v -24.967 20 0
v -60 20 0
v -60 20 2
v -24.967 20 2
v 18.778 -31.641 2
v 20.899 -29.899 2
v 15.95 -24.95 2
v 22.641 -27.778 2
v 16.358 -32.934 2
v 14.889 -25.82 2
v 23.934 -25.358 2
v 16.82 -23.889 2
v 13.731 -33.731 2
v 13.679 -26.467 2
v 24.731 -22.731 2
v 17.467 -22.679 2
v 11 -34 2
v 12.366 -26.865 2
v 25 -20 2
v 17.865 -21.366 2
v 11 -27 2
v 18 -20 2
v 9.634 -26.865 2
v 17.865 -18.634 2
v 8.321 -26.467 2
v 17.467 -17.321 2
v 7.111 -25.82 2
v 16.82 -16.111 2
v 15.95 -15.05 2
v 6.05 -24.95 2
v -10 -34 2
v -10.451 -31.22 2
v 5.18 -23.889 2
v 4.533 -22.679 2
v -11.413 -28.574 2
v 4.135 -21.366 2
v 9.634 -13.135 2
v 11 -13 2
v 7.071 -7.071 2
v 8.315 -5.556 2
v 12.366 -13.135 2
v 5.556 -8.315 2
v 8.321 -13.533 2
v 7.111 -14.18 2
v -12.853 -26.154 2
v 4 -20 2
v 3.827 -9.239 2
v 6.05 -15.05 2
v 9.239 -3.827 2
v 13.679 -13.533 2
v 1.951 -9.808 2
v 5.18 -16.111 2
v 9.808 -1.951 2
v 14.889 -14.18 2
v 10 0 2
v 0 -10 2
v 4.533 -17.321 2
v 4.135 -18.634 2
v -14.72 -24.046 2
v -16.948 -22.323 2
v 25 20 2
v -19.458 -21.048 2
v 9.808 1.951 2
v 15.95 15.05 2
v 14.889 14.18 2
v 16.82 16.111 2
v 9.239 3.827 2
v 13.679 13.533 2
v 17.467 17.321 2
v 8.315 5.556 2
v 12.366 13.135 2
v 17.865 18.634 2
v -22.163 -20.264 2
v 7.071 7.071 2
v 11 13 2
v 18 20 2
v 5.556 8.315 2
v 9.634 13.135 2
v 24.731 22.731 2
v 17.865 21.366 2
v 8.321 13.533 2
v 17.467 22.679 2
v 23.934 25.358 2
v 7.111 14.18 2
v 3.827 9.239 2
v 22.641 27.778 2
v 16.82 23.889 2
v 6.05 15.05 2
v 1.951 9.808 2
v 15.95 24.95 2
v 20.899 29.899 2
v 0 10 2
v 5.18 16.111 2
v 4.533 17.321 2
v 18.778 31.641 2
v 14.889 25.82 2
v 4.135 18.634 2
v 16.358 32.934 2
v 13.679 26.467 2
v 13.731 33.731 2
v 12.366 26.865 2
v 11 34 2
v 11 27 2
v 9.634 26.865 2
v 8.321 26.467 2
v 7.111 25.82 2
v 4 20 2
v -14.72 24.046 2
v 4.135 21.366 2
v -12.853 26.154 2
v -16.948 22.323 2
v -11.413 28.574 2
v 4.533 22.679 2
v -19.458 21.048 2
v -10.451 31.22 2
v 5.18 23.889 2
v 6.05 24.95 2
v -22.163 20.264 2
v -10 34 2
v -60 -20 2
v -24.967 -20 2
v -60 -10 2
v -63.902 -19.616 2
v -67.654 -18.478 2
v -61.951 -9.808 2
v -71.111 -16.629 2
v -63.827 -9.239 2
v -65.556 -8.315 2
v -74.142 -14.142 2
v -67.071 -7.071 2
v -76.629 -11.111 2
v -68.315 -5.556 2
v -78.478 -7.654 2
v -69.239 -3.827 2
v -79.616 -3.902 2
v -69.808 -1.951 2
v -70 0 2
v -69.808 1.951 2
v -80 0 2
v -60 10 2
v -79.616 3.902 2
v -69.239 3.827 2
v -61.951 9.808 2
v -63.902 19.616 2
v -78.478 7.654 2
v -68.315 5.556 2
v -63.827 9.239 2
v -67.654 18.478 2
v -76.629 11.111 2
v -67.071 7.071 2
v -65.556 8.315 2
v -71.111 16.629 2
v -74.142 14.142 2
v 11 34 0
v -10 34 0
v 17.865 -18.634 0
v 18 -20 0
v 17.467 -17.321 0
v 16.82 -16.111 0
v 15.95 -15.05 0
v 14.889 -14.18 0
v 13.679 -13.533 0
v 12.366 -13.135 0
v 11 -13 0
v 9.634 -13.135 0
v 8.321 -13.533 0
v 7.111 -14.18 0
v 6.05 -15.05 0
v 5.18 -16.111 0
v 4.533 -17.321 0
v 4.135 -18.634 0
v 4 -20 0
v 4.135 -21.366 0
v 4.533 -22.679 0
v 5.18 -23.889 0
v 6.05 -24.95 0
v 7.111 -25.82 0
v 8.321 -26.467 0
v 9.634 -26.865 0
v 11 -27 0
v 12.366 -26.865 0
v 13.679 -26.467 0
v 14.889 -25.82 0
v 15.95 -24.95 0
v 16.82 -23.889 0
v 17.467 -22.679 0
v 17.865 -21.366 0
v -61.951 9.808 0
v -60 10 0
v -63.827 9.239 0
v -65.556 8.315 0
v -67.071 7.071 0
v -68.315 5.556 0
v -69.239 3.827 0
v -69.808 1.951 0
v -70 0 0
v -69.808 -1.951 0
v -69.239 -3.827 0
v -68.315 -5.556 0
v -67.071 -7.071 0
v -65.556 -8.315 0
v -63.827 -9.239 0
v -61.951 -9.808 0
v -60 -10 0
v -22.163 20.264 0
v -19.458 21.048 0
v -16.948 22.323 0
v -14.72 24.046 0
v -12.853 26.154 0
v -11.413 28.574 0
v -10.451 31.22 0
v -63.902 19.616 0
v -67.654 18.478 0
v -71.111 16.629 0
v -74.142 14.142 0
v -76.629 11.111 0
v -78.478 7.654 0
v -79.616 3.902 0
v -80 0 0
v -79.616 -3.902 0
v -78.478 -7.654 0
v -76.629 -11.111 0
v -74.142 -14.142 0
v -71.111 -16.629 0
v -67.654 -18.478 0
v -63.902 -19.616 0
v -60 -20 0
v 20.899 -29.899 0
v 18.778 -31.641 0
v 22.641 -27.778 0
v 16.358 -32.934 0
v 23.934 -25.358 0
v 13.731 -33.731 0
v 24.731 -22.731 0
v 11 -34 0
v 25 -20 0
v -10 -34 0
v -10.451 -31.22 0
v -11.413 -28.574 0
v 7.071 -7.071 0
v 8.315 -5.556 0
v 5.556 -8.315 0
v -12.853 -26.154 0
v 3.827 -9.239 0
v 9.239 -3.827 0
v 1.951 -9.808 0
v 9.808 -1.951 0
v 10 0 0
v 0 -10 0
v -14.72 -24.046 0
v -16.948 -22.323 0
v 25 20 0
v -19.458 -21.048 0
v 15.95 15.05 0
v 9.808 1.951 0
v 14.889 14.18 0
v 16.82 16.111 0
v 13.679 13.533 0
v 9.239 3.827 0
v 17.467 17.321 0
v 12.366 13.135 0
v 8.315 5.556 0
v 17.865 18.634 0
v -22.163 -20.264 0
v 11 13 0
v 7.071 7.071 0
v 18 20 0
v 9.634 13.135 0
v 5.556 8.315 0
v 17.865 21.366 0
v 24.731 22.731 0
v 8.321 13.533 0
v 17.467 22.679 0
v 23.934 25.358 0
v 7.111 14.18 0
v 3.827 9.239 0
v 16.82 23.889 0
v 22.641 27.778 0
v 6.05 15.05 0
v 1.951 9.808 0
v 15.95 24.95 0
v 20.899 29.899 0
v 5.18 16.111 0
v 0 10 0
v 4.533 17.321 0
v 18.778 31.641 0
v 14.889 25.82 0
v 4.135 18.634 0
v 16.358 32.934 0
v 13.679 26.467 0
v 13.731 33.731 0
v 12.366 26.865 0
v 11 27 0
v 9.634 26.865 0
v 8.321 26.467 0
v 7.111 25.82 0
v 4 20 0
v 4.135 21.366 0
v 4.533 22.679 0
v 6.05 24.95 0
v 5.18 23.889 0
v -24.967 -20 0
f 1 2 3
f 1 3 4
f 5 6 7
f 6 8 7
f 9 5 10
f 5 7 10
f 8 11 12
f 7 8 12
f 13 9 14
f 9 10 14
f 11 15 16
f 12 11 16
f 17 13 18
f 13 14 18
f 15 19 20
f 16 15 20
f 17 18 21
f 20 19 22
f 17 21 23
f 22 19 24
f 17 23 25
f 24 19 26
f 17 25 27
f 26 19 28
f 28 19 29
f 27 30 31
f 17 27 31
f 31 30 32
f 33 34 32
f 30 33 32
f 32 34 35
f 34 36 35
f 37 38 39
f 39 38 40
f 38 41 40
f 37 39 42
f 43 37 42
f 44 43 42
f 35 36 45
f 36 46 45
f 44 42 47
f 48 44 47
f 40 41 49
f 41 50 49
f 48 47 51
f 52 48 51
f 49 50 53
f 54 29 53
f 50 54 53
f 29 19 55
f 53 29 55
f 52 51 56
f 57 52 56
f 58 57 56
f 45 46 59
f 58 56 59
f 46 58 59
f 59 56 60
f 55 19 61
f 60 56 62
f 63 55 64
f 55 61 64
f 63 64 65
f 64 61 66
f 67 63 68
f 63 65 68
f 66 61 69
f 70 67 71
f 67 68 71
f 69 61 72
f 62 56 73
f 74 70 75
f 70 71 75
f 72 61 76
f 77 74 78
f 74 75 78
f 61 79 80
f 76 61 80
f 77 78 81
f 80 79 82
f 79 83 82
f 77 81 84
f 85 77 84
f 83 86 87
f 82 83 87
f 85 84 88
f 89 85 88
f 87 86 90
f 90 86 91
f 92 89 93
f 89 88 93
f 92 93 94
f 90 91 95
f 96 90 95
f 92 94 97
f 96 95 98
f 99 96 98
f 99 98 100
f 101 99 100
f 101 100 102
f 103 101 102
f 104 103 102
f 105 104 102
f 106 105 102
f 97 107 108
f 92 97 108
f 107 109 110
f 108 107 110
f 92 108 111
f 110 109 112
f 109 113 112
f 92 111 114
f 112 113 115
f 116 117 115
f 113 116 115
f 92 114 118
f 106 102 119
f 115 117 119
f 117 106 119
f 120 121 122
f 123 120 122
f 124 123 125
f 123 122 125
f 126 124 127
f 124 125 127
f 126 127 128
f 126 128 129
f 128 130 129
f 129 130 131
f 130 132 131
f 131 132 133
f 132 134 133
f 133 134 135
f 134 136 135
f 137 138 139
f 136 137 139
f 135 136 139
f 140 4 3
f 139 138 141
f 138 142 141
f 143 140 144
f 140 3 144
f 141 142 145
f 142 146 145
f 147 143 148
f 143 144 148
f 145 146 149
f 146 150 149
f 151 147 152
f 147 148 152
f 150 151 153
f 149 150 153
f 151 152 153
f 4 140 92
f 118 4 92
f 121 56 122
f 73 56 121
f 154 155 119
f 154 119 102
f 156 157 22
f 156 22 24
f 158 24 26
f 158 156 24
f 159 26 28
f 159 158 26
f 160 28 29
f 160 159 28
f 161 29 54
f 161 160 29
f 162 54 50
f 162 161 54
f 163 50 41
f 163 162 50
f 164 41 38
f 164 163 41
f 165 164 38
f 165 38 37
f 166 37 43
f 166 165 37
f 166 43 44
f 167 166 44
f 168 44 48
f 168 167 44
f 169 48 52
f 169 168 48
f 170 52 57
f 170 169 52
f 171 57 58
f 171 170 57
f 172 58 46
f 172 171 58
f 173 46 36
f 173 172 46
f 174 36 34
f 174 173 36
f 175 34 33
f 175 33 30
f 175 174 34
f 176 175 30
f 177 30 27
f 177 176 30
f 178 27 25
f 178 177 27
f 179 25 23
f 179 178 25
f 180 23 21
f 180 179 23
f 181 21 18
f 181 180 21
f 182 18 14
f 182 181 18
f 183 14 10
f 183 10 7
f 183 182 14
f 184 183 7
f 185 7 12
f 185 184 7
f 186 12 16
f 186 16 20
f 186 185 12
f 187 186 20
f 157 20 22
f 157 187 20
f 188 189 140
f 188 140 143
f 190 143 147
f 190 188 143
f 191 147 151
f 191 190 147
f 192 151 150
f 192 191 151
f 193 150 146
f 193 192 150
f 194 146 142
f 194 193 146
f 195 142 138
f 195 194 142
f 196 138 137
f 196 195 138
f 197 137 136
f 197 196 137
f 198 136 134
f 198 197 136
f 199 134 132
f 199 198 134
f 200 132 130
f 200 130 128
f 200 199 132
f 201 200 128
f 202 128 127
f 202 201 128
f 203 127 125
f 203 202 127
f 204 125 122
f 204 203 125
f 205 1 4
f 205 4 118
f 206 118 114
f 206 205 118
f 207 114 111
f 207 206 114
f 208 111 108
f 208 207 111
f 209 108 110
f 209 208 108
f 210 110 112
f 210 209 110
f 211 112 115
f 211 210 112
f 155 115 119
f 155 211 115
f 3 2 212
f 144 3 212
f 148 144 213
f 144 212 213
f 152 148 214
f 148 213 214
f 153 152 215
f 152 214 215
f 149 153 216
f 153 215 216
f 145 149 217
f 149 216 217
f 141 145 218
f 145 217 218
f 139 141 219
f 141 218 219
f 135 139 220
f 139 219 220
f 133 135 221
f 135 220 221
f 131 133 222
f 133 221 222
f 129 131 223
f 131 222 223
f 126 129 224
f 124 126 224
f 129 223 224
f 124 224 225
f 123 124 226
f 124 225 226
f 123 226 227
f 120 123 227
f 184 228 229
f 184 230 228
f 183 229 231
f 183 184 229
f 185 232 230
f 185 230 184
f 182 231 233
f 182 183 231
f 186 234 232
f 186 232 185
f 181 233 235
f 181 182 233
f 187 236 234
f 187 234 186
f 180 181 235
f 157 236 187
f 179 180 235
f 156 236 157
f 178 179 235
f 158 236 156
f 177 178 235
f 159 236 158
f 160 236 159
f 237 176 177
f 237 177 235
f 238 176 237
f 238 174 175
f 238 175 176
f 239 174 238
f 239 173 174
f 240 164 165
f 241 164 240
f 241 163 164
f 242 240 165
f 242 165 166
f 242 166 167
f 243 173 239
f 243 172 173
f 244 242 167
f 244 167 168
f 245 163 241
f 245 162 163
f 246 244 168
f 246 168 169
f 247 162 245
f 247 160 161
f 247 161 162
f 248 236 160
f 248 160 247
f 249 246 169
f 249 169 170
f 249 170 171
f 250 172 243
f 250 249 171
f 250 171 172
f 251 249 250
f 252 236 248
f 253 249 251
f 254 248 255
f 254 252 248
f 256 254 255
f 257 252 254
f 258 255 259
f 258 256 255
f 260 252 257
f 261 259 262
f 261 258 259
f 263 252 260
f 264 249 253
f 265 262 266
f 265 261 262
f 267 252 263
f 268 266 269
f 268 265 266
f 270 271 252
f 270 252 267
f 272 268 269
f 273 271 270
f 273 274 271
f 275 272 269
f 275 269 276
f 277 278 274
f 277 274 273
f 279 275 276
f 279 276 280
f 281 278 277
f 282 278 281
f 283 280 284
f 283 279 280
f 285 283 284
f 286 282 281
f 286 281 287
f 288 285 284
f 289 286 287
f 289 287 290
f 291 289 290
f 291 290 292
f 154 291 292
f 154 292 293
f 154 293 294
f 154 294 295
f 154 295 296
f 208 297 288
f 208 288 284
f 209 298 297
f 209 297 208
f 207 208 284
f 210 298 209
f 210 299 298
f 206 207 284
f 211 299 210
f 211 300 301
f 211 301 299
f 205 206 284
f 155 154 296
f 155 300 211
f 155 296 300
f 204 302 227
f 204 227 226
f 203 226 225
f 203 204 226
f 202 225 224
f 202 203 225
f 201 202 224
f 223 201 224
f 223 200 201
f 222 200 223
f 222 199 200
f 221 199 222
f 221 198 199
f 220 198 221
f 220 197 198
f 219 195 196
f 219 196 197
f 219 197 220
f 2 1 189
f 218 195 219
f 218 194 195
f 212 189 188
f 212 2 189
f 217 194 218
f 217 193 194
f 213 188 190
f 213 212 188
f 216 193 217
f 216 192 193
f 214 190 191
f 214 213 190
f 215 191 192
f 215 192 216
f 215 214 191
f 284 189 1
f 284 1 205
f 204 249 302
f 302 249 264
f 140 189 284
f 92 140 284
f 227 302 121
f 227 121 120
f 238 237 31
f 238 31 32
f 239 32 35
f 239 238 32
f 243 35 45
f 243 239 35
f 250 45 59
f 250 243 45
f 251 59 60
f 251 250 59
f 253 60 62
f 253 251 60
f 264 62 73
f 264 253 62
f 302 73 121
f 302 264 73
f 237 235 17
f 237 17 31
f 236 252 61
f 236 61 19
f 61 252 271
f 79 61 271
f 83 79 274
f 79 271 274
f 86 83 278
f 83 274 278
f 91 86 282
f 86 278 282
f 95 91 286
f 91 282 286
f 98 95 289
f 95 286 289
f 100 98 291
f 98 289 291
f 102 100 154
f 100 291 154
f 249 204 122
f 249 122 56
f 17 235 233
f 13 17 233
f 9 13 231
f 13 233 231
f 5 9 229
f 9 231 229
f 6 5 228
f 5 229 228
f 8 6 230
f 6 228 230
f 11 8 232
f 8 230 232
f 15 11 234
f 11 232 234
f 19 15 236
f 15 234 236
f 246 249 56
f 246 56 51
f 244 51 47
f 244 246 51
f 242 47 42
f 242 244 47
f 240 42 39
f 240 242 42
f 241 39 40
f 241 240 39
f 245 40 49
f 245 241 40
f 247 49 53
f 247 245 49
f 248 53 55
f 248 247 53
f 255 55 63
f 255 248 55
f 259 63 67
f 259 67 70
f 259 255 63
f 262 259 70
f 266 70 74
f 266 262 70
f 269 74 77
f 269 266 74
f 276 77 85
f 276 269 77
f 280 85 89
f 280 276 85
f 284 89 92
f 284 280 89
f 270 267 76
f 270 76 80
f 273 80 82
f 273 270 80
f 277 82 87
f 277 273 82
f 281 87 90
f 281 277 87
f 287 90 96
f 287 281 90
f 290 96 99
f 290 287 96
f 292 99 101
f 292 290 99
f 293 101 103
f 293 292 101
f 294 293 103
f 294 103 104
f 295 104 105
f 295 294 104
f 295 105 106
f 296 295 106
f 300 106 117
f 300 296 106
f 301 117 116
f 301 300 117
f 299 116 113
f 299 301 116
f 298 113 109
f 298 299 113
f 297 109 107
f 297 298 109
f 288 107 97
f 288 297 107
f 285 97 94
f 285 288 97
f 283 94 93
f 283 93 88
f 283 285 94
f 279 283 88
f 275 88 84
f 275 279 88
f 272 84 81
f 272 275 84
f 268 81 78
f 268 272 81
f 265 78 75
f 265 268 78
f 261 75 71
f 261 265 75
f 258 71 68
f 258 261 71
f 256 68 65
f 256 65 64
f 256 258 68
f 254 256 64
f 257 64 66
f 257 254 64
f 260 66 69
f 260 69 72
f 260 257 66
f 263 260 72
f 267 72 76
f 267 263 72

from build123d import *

# Parameters (mm, degrees)
SKETCH_R  = 7
PAD_DEPTH = 2


with BuildPart() as part:
    # Sketch → Pad (new body)
    with BuildSketch(Plane.XY):
        with BuildLine():
            Line((-10, 34), (11, 34))
            ThreePointArc((25, 20), (20.899495, 29.899495), (11, 34))
            Line((25, 20), (25, -20))
            ThreePointArc((11, -34), (20.899495, -29.899495), (25, -20))
            Line((11, -34), (-10, -34))
            ThreePointArc((-10, -34), (-14.719679, -24.045549), (-24.96663, -20))
            Line((-24.96663, -20), (-60.000002, -20))
            ThreePointArc((-60.000002, 20), (-80, 0), (-60.000002, -20))
            Line((-60.000002, 20), (-24.96663, 20))
            ThreePointArc((-24.96663, 20), (-14.719679, 24.045549), (-10, 34))
        make_face()
        with Locations((11, 20)):
            Circle(SKETCH_R, mode=Mode.SUBTRACT)
        with Locations((11, -20)):
            Circle(SKETCH_R, mode=Mode.SUBTRACT)
        with BuildLine():
            ThreePointArc((-60.000002, 10), (-70, 0), (-60.000002, -10))
            Line((-60.000002, -10), (0, -10))
            ThreePointArc((0, -10), (10, 0), (0, 10))
            Line((-60.000002, 10), (0, 10))
        make_face(mode=Mode.SUBTRACT)
    extrude(amount=PAD_DEPTH)


solid = part.part
